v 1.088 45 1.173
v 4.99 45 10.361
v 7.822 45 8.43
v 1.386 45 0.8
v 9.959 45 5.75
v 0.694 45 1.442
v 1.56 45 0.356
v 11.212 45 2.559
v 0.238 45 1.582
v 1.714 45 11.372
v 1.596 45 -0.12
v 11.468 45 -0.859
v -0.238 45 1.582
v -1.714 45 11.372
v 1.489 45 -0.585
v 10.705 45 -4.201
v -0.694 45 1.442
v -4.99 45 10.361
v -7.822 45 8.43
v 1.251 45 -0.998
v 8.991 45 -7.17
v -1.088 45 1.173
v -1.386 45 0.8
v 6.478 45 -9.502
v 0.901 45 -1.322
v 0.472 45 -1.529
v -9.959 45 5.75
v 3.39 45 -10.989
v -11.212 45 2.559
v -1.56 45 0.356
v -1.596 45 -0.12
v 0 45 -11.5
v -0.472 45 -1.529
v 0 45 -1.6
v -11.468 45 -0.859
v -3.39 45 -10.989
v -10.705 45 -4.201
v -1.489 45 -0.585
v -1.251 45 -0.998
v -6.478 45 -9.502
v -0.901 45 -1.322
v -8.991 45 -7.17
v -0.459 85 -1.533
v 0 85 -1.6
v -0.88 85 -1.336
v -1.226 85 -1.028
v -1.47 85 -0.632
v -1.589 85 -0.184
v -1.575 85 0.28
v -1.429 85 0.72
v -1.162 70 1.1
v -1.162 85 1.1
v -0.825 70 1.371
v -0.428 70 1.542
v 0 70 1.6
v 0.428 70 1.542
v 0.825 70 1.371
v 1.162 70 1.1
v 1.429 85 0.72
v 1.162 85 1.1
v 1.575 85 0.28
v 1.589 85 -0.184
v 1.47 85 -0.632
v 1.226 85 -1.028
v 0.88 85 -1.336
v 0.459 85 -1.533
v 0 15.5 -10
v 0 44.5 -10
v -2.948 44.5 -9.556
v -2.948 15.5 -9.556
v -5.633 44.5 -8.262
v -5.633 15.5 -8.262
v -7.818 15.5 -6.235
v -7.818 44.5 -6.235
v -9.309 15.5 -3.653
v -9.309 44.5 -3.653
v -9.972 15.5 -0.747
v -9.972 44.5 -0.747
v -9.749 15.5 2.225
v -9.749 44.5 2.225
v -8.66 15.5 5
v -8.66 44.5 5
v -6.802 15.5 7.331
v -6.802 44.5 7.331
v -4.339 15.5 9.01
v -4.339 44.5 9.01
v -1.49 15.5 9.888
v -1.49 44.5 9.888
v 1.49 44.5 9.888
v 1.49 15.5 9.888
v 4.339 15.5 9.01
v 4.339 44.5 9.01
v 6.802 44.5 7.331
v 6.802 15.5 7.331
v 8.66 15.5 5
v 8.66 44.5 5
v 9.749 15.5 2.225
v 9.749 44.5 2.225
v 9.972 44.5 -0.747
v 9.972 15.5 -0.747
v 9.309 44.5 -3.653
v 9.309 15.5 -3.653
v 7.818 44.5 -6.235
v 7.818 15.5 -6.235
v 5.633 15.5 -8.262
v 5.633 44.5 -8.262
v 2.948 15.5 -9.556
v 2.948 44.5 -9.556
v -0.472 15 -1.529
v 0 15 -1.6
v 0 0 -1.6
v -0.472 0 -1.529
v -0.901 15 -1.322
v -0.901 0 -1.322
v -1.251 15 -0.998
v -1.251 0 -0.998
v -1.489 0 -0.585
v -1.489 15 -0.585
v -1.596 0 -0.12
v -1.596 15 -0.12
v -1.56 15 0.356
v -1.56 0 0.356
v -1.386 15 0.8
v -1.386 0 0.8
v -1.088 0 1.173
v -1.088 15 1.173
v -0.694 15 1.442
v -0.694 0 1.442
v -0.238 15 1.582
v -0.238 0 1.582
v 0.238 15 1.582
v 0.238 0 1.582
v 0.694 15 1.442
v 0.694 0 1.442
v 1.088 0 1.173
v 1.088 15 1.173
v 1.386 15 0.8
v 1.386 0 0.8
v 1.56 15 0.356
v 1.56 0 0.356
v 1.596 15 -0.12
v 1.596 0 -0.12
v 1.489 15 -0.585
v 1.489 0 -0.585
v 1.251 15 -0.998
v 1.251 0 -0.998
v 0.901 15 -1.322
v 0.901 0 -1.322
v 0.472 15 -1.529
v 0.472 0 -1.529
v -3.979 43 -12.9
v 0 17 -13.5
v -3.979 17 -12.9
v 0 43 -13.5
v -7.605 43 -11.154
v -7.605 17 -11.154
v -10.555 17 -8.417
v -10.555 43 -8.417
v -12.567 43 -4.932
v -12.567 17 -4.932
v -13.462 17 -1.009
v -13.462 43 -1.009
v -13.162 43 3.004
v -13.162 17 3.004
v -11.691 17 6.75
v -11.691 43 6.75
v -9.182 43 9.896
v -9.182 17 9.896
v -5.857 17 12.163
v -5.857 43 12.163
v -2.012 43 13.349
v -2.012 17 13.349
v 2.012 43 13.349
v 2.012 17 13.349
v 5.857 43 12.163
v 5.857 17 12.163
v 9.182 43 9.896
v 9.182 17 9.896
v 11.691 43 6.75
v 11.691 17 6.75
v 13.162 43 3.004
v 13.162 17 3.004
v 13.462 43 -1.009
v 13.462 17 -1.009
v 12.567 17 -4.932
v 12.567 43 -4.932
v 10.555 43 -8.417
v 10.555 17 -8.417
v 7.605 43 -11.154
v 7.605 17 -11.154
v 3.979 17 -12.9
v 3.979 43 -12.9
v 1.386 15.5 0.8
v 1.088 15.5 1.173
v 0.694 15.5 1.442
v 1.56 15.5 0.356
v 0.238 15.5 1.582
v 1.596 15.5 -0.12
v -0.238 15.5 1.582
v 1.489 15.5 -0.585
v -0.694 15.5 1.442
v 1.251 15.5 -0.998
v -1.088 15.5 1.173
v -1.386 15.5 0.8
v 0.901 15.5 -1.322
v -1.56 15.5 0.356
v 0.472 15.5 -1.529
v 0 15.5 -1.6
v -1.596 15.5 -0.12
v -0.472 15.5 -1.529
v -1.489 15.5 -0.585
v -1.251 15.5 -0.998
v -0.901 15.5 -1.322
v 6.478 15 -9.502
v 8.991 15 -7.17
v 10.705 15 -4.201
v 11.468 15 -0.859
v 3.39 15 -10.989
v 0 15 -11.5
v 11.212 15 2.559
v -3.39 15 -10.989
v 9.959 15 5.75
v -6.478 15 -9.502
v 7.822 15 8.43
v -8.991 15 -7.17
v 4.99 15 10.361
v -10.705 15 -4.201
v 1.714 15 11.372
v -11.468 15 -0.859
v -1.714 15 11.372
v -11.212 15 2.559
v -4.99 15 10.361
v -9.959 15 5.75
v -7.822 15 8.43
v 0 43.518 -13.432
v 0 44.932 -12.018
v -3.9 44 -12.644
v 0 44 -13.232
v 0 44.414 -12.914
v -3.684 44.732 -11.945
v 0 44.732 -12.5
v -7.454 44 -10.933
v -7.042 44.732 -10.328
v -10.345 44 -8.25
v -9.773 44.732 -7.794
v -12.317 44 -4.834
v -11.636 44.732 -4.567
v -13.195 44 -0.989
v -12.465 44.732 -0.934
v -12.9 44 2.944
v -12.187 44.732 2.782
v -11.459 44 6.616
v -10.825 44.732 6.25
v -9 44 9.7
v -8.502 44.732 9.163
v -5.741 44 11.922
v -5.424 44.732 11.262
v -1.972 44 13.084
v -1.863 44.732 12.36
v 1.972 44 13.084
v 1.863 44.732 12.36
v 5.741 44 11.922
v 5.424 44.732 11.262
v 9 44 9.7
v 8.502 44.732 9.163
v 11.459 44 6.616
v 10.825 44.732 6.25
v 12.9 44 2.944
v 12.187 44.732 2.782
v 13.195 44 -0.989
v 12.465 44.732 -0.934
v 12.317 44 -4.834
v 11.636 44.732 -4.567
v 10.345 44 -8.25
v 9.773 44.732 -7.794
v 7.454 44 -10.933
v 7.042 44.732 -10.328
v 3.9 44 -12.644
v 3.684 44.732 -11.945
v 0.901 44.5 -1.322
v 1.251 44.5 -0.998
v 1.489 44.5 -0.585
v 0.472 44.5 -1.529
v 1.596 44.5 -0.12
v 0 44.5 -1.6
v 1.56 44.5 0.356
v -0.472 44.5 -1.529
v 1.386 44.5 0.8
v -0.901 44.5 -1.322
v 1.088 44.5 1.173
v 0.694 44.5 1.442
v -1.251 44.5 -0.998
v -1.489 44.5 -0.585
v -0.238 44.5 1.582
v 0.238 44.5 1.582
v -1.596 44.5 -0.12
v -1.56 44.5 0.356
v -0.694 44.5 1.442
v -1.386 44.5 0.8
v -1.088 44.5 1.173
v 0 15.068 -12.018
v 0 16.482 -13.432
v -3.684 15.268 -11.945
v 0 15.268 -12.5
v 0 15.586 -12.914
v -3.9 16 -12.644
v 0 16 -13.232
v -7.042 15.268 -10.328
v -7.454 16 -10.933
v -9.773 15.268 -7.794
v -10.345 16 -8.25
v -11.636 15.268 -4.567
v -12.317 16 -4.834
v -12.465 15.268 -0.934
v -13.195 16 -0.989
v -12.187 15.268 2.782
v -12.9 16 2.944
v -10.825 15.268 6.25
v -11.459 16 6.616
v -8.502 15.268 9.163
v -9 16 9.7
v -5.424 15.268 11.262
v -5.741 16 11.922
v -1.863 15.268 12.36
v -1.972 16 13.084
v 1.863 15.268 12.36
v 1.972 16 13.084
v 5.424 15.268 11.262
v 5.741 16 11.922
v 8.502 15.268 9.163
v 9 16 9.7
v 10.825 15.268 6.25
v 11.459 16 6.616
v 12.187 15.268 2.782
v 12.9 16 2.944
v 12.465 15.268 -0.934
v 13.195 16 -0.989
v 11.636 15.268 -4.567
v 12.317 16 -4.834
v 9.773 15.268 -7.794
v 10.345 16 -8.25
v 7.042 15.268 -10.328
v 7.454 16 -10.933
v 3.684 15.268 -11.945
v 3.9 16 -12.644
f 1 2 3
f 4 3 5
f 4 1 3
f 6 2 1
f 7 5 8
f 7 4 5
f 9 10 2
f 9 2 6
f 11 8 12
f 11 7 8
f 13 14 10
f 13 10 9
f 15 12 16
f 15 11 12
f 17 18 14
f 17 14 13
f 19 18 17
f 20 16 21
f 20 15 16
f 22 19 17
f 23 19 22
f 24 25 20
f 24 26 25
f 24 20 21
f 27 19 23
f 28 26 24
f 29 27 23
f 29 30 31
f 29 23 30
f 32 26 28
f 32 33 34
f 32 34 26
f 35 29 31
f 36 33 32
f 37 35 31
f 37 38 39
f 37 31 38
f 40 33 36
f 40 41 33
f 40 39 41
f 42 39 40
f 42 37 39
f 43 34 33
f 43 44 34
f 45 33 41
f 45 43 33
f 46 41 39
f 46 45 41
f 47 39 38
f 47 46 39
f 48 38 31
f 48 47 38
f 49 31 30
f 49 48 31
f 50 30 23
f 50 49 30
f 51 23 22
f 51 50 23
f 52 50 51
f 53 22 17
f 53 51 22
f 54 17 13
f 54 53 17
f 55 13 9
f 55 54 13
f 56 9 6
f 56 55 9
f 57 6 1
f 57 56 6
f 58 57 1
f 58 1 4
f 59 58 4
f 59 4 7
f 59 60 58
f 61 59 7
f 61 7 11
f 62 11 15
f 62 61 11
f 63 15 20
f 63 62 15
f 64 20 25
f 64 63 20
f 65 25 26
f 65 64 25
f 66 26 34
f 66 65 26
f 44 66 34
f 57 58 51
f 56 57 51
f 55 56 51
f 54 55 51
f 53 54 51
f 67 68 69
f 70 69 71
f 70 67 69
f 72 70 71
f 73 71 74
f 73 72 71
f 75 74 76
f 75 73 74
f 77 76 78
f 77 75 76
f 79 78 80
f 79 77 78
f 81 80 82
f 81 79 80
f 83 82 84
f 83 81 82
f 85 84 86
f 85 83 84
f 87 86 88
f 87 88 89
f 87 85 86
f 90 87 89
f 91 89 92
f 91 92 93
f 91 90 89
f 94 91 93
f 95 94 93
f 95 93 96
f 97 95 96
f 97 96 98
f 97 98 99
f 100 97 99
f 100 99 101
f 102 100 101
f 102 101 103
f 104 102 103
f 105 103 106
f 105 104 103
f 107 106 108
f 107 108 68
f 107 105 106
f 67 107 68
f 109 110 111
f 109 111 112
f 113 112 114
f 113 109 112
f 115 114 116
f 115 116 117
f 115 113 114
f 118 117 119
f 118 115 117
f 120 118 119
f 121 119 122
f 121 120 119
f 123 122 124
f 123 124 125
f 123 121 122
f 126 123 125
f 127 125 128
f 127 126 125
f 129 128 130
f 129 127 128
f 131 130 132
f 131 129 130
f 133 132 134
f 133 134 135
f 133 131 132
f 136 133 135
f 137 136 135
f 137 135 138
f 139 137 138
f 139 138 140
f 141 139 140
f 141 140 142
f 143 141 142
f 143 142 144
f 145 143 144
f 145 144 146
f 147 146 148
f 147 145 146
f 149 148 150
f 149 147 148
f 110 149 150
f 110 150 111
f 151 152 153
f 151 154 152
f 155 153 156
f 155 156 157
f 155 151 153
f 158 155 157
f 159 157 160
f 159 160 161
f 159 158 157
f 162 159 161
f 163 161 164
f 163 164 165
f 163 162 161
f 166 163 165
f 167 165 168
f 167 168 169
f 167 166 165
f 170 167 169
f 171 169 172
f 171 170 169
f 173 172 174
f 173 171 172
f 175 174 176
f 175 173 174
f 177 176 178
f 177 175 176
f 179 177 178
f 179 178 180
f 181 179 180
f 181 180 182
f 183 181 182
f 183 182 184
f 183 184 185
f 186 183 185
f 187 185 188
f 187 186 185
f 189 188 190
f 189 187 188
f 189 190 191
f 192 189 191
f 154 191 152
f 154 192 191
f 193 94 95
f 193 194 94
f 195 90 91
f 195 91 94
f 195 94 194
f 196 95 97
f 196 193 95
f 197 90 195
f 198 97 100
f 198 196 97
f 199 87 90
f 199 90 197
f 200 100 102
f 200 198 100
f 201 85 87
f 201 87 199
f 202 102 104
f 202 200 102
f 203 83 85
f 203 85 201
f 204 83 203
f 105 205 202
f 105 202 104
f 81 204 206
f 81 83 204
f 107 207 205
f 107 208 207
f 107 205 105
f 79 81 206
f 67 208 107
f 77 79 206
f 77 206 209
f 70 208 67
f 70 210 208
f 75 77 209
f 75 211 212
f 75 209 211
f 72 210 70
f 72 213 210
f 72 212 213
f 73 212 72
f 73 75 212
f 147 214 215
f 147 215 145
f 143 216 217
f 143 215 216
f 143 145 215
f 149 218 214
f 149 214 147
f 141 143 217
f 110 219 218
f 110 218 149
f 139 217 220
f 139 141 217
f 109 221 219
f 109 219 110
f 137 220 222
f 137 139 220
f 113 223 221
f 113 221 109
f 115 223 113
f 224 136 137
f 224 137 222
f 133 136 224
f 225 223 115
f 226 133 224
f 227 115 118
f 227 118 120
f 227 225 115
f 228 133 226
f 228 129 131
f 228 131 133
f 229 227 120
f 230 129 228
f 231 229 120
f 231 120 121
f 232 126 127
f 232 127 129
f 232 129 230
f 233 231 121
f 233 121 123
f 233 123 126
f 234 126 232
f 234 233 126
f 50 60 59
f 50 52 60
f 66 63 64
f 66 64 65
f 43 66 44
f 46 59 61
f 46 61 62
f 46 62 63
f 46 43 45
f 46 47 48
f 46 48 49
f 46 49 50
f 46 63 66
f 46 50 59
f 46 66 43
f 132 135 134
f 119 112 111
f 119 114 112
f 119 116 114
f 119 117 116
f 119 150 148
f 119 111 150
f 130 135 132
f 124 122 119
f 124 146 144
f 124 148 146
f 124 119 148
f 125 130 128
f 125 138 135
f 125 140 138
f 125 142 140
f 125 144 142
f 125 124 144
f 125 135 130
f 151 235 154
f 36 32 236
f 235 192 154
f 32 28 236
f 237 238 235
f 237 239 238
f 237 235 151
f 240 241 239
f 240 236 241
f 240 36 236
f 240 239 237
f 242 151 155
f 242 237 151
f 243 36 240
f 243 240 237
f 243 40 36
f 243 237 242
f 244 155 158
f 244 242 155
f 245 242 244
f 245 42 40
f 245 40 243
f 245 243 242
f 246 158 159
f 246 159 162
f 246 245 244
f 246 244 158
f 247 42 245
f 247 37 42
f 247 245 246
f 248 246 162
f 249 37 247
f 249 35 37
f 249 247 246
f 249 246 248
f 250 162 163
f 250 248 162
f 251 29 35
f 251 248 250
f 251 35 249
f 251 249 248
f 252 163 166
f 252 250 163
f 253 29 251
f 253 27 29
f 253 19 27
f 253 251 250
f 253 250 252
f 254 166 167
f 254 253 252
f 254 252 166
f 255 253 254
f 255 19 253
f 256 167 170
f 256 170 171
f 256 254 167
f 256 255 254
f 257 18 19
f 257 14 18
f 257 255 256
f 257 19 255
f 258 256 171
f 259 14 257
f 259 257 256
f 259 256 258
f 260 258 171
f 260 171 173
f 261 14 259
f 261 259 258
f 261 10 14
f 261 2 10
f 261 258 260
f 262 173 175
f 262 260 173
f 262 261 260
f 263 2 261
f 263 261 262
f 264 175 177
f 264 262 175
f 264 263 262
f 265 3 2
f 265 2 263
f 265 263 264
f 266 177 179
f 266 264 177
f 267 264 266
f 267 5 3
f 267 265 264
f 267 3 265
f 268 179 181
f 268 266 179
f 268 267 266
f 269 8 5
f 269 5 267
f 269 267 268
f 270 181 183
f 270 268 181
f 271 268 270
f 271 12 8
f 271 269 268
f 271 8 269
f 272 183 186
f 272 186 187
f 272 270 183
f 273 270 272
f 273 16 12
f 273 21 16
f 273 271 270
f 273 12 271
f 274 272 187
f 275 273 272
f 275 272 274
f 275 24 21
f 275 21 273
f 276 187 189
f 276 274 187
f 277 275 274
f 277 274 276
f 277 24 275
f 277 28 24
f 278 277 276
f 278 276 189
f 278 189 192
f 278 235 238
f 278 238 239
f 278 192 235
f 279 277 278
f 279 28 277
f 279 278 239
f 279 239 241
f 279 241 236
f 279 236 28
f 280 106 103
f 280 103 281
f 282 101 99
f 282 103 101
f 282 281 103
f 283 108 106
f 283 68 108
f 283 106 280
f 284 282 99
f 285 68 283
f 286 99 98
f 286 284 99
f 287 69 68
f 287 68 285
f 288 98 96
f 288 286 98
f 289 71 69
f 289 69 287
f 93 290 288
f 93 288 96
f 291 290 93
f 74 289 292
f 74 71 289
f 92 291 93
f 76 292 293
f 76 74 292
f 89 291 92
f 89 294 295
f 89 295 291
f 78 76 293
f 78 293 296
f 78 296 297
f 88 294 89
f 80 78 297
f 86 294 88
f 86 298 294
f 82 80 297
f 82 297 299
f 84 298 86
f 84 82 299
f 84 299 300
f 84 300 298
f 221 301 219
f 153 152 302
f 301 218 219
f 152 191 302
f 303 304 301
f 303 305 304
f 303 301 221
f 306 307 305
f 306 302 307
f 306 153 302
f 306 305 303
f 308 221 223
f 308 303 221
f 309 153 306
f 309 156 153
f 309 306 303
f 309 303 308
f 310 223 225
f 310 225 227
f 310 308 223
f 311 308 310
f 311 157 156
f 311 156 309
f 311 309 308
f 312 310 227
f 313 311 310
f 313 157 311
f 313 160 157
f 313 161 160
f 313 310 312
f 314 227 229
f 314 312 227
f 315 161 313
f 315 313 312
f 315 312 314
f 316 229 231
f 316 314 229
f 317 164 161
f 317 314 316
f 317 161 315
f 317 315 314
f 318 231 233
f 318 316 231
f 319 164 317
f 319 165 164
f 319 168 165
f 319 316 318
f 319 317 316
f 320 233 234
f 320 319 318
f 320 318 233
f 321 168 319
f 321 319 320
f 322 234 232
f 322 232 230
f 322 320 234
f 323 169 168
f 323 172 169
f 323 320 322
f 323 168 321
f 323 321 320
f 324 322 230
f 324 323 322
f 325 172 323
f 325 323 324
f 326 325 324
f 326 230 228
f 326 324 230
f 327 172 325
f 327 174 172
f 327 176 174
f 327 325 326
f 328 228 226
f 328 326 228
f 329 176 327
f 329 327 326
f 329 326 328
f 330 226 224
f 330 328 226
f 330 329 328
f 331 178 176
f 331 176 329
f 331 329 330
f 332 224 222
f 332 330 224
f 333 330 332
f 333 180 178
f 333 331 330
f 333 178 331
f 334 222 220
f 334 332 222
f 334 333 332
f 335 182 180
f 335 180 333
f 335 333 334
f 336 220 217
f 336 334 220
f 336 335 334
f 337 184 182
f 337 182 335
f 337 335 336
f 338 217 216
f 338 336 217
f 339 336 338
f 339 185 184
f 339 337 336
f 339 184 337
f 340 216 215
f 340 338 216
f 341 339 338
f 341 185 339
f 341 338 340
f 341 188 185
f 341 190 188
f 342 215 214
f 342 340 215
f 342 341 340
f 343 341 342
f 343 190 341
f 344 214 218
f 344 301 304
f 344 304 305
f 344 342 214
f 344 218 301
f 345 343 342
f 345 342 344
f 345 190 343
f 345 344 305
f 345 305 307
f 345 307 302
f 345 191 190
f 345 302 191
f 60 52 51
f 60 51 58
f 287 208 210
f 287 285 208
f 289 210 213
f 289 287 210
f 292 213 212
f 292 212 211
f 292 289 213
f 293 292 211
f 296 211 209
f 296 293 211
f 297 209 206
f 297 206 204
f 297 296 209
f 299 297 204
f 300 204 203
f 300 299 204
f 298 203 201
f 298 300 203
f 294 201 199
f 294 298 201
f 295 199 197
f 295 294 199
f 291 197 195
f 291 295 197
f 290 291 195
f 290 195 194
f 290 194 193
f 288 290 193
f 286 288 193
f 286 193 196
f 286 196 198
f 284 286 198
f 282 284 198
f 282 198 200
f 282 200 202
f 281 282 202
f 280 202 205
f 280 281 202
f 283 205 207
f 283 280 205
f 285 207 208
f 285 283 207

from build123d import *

# Parameters (mm, degrees)
ENL_V_MAT_EXTRU_1_DEPTH                   = 15
TROU_TARAUD_M31_D                         = 2.5
TROU_TARAUD_M31_DEPTH                     = 8.5
TROU_TARAUD_M31_TIP                       = 0.751075774
ESQUISSE5_W                               = 0.7
ESQUISSE5_H                               = 3.8
BOSS_EXTRU_1_DEPTH                        = 6.7
CHANFREIN1_SIZE                           = 1
ESQUISSE6_R                               = 0.8
ENL_V_MAT_EXTRU_2_DEPTH                   = 6.7
R_P_TITION_CIRCULAIRE1_COUNT              = 2
CHANFREIN1_OF_R_P_TITION_CIRCULAIRE1_SIZE = 1
ENL_V_MAT_EXTRU_4_DEPTH                   = 90.145947749
ENL_V_MAT_EXTRU_4_DEPTH_BACK              = 90.145947749
ESQUISSE7_R                               = 19
ESQUISSE7_R_2                             = 1.6


with BuildPart() as part:
    # Esquisse1 → Révolution1 (revolve)
    with BuildSketch(Plane.XY, mode=Mode.PRIVATE) as r_volution1_sk:
        with BuildLine():
            Line((0, 0), (-1.6, 0))
            Line((-1.6, 0), (-1.6, 2.6))
            Line((-1.6, 2.6), (-5.075, 2.6))
            Line((-5.075, 2.6), (-5.075, 4.5))
            Line((-5.075, 4.5), (-19, 4.5))
            Line((-19, 4.5), (-19, 58))
            Line((-19, 58), (-17.85, 58))
            Line((-17.85, 58), (-17.85, 60))
            ThreePointArc((-17.85, 60), (-17.410660172, 61.060660172), (-16.35, 61.5))
            Line((-16.35, 61.5), (-6.5, 61.5))
            Line((-6.5, 61.5), (-6.5, 65.8))
            Line((-6.5, 65.8), (-1.6, 65.8))
            Line((-1.6, 65.8), (-1.6, 85))
            Line((-1.6, 85), (0, 85))
            Line((0, 85), (0, 0))
        make_face()
    revolve(r_volution1_sk.sketch.rotate(Axis((0, 0, 0), (0, 1, 0)), 270), axis=Axis((0, 0, 0), (0, 1, 0)))

    # Esquisse2 → Enlèv. mat.-Extru.1 (cut)
    with BuildSketch(Plane(origin=(0, 85, 0), x_dir=(1, 0, 0), z_dir=(0, 1, 0))):
        with BuildLine():
            Line((-1.161895004, -1.1), (1.161895004, -1.1))
            ThreePointArc((1.161895004, -1.1), (0, -1.6), (-1.161895004, -1.1))
        make_face()
    extrude(amount=-ENL_V_MAT_EXTRU_1_DEPTH, mode=Mode.SUBTRACT)

    # Trou taraudé M31
    with Locations(Plane(origin=(0, 61.5, 0), x_dir=(-1, 0, 0), z_dir=(0, 1, 0))):
        with Locations((12.5, 0), (-12.5, 0)):
            Hole(TROU_TARAUD_M31_D / 2, depth=TROU_TARAUD_M31_DEPTH)
            with Locations((0, 0, -(TROU_TARAUD_M31_DEPTH + TROU_TARAUD_M31_TIP / 2))):  # 118° drill point
                Cone(0, TROU_TARAUD_M31_D / 2, TROU_TARAUD_M31_TIP, mode=Mode.SUBTRACT)

    # Esquisse5 → Boss.-Extru.1 (add)
    with BuildSketch(Plane.XZ.offset(-4.5)):
        with Locations((-13.95, 0)):
            Rectangle(ESQUISSE5_W, ESQUISSE5_H)
    boss_extru_1 = extrude(amount=BOSS_EXTRU_1_DEPTH)

    # Chanfrein1
    chanfrein1_edges = [part.edges().sort_by_distance(p)[0] for p in [
        (-13.95, -2.2, -1.9),
        (-13.95, -2.2, 1.9),
    ]]
    chamfer(chanfrein1_edges, length=CHANFREIN1_SIZE)

    # Esquisse6 → Enlèv. mat.-Extru.2 (cut)
    with BuildSketch(Plane.ZY.offset(14.3)):
        Circle(ESQUISSE6_R)
    enl_v_mat_extru_2 = extrude(amount=-ENL_V_MAT_EXTRU_2_DEPTH, mode=Mode.SUBTRACT)

    # Répétition circulaire1: Boss.-Extru.1, Enlèv. mat.-Extru.2 ×2 about axis
    r_p_tition_circulaire1_axis = Axis((0, 0, 0), (0, 1, 0))
    add([boss_extru_1.rotate(r_p_tition_circulaire1_axis, i * 360 / R_P_TITION_CIRCULAIRE1_COUNT) for i in range(1, R_P_TITION_CIRCULAIRE1_COUNT)])
    add([enl_v_mat_extru_2.rotate(r_p_tition_circulaire1_axis, i * 360 / R_P_TITION_CIRCULAIRE1_COUNT) for i in range(1, R_P_TITION_CIRCULAIRE1_COUNT)], mode=Mode.SUBTRACT)

    # Chanfrein1 of Répétition circulaire1
    chanfrein1_of_r_p_tition_circulaire1_edges = [part.edges().sort_by_distance(p)[0] for p in [
        (13.95, -2.2, 1.9),
        (13.95, -2.2, -1.9),
    ]]
    chamfer(chanfrein1_of_r_p_tition_circulaire1_edges, length=CHANFREIN1_OF_R_P_TITION_CIRCULAIRE1_SIZE)

    # Esquisse7 → Enlèv. mat.-Extru.4 (cut, two sides: drawn at the far end of the back side and taken through both)
    with BuildSketch(Plane.XZ.offset(-ENL_V_MAT_EXTRU_4_DEPTH_BACK)):
        Circle(ESQUISSE7_R)
        with Locations(Location((0, 0, 0), (0, 0, 270))):
            Circle(ESQUISSE7_R_2, mode=Mode.SUBTRACT)
    extrude(amount=ENL_V_MAT_EXTRU_4_DEPTH + ENL_V_MAT_EXTRU_4_DEPTH_BACK, mode=Mode.SUBTRACT)

    # Esquisse9 → Révolution2 (revolve)
    with BuildSketch(Plane.XY, mode=Mode.PRIVATE) as r_volution2_sk:
        with BuildLine():
            Line((0, 15), (11.5, 15))
            ThreePointArc((11.5, 15), (12.914213562, 15.585786438), (13.5, 17))
            Line((13.5, 17), (13.5, 43))
            ThreePointArc((13.5, 43), (12.914213562, 44.414213562), (11.5, 45))
            Line((11.5, 45), (0, 45))
            Line((0, 45), (0, 44.5))
            Line((0, 44.5), (10, 44.5))
            Line((10, 44.5), (10, 15.5))
            Line((10, 15.5), (0, 15.5))
            Line((0, 15.5), (0, 15))
        make_face()
    revolve(r_volution2_sk.sketch.rotate(Axis((0, 0, 0), (0, 1, 0)), 90), axis=Axis((0, 0, 0), (0, 1, 0)))


solid = part.part
